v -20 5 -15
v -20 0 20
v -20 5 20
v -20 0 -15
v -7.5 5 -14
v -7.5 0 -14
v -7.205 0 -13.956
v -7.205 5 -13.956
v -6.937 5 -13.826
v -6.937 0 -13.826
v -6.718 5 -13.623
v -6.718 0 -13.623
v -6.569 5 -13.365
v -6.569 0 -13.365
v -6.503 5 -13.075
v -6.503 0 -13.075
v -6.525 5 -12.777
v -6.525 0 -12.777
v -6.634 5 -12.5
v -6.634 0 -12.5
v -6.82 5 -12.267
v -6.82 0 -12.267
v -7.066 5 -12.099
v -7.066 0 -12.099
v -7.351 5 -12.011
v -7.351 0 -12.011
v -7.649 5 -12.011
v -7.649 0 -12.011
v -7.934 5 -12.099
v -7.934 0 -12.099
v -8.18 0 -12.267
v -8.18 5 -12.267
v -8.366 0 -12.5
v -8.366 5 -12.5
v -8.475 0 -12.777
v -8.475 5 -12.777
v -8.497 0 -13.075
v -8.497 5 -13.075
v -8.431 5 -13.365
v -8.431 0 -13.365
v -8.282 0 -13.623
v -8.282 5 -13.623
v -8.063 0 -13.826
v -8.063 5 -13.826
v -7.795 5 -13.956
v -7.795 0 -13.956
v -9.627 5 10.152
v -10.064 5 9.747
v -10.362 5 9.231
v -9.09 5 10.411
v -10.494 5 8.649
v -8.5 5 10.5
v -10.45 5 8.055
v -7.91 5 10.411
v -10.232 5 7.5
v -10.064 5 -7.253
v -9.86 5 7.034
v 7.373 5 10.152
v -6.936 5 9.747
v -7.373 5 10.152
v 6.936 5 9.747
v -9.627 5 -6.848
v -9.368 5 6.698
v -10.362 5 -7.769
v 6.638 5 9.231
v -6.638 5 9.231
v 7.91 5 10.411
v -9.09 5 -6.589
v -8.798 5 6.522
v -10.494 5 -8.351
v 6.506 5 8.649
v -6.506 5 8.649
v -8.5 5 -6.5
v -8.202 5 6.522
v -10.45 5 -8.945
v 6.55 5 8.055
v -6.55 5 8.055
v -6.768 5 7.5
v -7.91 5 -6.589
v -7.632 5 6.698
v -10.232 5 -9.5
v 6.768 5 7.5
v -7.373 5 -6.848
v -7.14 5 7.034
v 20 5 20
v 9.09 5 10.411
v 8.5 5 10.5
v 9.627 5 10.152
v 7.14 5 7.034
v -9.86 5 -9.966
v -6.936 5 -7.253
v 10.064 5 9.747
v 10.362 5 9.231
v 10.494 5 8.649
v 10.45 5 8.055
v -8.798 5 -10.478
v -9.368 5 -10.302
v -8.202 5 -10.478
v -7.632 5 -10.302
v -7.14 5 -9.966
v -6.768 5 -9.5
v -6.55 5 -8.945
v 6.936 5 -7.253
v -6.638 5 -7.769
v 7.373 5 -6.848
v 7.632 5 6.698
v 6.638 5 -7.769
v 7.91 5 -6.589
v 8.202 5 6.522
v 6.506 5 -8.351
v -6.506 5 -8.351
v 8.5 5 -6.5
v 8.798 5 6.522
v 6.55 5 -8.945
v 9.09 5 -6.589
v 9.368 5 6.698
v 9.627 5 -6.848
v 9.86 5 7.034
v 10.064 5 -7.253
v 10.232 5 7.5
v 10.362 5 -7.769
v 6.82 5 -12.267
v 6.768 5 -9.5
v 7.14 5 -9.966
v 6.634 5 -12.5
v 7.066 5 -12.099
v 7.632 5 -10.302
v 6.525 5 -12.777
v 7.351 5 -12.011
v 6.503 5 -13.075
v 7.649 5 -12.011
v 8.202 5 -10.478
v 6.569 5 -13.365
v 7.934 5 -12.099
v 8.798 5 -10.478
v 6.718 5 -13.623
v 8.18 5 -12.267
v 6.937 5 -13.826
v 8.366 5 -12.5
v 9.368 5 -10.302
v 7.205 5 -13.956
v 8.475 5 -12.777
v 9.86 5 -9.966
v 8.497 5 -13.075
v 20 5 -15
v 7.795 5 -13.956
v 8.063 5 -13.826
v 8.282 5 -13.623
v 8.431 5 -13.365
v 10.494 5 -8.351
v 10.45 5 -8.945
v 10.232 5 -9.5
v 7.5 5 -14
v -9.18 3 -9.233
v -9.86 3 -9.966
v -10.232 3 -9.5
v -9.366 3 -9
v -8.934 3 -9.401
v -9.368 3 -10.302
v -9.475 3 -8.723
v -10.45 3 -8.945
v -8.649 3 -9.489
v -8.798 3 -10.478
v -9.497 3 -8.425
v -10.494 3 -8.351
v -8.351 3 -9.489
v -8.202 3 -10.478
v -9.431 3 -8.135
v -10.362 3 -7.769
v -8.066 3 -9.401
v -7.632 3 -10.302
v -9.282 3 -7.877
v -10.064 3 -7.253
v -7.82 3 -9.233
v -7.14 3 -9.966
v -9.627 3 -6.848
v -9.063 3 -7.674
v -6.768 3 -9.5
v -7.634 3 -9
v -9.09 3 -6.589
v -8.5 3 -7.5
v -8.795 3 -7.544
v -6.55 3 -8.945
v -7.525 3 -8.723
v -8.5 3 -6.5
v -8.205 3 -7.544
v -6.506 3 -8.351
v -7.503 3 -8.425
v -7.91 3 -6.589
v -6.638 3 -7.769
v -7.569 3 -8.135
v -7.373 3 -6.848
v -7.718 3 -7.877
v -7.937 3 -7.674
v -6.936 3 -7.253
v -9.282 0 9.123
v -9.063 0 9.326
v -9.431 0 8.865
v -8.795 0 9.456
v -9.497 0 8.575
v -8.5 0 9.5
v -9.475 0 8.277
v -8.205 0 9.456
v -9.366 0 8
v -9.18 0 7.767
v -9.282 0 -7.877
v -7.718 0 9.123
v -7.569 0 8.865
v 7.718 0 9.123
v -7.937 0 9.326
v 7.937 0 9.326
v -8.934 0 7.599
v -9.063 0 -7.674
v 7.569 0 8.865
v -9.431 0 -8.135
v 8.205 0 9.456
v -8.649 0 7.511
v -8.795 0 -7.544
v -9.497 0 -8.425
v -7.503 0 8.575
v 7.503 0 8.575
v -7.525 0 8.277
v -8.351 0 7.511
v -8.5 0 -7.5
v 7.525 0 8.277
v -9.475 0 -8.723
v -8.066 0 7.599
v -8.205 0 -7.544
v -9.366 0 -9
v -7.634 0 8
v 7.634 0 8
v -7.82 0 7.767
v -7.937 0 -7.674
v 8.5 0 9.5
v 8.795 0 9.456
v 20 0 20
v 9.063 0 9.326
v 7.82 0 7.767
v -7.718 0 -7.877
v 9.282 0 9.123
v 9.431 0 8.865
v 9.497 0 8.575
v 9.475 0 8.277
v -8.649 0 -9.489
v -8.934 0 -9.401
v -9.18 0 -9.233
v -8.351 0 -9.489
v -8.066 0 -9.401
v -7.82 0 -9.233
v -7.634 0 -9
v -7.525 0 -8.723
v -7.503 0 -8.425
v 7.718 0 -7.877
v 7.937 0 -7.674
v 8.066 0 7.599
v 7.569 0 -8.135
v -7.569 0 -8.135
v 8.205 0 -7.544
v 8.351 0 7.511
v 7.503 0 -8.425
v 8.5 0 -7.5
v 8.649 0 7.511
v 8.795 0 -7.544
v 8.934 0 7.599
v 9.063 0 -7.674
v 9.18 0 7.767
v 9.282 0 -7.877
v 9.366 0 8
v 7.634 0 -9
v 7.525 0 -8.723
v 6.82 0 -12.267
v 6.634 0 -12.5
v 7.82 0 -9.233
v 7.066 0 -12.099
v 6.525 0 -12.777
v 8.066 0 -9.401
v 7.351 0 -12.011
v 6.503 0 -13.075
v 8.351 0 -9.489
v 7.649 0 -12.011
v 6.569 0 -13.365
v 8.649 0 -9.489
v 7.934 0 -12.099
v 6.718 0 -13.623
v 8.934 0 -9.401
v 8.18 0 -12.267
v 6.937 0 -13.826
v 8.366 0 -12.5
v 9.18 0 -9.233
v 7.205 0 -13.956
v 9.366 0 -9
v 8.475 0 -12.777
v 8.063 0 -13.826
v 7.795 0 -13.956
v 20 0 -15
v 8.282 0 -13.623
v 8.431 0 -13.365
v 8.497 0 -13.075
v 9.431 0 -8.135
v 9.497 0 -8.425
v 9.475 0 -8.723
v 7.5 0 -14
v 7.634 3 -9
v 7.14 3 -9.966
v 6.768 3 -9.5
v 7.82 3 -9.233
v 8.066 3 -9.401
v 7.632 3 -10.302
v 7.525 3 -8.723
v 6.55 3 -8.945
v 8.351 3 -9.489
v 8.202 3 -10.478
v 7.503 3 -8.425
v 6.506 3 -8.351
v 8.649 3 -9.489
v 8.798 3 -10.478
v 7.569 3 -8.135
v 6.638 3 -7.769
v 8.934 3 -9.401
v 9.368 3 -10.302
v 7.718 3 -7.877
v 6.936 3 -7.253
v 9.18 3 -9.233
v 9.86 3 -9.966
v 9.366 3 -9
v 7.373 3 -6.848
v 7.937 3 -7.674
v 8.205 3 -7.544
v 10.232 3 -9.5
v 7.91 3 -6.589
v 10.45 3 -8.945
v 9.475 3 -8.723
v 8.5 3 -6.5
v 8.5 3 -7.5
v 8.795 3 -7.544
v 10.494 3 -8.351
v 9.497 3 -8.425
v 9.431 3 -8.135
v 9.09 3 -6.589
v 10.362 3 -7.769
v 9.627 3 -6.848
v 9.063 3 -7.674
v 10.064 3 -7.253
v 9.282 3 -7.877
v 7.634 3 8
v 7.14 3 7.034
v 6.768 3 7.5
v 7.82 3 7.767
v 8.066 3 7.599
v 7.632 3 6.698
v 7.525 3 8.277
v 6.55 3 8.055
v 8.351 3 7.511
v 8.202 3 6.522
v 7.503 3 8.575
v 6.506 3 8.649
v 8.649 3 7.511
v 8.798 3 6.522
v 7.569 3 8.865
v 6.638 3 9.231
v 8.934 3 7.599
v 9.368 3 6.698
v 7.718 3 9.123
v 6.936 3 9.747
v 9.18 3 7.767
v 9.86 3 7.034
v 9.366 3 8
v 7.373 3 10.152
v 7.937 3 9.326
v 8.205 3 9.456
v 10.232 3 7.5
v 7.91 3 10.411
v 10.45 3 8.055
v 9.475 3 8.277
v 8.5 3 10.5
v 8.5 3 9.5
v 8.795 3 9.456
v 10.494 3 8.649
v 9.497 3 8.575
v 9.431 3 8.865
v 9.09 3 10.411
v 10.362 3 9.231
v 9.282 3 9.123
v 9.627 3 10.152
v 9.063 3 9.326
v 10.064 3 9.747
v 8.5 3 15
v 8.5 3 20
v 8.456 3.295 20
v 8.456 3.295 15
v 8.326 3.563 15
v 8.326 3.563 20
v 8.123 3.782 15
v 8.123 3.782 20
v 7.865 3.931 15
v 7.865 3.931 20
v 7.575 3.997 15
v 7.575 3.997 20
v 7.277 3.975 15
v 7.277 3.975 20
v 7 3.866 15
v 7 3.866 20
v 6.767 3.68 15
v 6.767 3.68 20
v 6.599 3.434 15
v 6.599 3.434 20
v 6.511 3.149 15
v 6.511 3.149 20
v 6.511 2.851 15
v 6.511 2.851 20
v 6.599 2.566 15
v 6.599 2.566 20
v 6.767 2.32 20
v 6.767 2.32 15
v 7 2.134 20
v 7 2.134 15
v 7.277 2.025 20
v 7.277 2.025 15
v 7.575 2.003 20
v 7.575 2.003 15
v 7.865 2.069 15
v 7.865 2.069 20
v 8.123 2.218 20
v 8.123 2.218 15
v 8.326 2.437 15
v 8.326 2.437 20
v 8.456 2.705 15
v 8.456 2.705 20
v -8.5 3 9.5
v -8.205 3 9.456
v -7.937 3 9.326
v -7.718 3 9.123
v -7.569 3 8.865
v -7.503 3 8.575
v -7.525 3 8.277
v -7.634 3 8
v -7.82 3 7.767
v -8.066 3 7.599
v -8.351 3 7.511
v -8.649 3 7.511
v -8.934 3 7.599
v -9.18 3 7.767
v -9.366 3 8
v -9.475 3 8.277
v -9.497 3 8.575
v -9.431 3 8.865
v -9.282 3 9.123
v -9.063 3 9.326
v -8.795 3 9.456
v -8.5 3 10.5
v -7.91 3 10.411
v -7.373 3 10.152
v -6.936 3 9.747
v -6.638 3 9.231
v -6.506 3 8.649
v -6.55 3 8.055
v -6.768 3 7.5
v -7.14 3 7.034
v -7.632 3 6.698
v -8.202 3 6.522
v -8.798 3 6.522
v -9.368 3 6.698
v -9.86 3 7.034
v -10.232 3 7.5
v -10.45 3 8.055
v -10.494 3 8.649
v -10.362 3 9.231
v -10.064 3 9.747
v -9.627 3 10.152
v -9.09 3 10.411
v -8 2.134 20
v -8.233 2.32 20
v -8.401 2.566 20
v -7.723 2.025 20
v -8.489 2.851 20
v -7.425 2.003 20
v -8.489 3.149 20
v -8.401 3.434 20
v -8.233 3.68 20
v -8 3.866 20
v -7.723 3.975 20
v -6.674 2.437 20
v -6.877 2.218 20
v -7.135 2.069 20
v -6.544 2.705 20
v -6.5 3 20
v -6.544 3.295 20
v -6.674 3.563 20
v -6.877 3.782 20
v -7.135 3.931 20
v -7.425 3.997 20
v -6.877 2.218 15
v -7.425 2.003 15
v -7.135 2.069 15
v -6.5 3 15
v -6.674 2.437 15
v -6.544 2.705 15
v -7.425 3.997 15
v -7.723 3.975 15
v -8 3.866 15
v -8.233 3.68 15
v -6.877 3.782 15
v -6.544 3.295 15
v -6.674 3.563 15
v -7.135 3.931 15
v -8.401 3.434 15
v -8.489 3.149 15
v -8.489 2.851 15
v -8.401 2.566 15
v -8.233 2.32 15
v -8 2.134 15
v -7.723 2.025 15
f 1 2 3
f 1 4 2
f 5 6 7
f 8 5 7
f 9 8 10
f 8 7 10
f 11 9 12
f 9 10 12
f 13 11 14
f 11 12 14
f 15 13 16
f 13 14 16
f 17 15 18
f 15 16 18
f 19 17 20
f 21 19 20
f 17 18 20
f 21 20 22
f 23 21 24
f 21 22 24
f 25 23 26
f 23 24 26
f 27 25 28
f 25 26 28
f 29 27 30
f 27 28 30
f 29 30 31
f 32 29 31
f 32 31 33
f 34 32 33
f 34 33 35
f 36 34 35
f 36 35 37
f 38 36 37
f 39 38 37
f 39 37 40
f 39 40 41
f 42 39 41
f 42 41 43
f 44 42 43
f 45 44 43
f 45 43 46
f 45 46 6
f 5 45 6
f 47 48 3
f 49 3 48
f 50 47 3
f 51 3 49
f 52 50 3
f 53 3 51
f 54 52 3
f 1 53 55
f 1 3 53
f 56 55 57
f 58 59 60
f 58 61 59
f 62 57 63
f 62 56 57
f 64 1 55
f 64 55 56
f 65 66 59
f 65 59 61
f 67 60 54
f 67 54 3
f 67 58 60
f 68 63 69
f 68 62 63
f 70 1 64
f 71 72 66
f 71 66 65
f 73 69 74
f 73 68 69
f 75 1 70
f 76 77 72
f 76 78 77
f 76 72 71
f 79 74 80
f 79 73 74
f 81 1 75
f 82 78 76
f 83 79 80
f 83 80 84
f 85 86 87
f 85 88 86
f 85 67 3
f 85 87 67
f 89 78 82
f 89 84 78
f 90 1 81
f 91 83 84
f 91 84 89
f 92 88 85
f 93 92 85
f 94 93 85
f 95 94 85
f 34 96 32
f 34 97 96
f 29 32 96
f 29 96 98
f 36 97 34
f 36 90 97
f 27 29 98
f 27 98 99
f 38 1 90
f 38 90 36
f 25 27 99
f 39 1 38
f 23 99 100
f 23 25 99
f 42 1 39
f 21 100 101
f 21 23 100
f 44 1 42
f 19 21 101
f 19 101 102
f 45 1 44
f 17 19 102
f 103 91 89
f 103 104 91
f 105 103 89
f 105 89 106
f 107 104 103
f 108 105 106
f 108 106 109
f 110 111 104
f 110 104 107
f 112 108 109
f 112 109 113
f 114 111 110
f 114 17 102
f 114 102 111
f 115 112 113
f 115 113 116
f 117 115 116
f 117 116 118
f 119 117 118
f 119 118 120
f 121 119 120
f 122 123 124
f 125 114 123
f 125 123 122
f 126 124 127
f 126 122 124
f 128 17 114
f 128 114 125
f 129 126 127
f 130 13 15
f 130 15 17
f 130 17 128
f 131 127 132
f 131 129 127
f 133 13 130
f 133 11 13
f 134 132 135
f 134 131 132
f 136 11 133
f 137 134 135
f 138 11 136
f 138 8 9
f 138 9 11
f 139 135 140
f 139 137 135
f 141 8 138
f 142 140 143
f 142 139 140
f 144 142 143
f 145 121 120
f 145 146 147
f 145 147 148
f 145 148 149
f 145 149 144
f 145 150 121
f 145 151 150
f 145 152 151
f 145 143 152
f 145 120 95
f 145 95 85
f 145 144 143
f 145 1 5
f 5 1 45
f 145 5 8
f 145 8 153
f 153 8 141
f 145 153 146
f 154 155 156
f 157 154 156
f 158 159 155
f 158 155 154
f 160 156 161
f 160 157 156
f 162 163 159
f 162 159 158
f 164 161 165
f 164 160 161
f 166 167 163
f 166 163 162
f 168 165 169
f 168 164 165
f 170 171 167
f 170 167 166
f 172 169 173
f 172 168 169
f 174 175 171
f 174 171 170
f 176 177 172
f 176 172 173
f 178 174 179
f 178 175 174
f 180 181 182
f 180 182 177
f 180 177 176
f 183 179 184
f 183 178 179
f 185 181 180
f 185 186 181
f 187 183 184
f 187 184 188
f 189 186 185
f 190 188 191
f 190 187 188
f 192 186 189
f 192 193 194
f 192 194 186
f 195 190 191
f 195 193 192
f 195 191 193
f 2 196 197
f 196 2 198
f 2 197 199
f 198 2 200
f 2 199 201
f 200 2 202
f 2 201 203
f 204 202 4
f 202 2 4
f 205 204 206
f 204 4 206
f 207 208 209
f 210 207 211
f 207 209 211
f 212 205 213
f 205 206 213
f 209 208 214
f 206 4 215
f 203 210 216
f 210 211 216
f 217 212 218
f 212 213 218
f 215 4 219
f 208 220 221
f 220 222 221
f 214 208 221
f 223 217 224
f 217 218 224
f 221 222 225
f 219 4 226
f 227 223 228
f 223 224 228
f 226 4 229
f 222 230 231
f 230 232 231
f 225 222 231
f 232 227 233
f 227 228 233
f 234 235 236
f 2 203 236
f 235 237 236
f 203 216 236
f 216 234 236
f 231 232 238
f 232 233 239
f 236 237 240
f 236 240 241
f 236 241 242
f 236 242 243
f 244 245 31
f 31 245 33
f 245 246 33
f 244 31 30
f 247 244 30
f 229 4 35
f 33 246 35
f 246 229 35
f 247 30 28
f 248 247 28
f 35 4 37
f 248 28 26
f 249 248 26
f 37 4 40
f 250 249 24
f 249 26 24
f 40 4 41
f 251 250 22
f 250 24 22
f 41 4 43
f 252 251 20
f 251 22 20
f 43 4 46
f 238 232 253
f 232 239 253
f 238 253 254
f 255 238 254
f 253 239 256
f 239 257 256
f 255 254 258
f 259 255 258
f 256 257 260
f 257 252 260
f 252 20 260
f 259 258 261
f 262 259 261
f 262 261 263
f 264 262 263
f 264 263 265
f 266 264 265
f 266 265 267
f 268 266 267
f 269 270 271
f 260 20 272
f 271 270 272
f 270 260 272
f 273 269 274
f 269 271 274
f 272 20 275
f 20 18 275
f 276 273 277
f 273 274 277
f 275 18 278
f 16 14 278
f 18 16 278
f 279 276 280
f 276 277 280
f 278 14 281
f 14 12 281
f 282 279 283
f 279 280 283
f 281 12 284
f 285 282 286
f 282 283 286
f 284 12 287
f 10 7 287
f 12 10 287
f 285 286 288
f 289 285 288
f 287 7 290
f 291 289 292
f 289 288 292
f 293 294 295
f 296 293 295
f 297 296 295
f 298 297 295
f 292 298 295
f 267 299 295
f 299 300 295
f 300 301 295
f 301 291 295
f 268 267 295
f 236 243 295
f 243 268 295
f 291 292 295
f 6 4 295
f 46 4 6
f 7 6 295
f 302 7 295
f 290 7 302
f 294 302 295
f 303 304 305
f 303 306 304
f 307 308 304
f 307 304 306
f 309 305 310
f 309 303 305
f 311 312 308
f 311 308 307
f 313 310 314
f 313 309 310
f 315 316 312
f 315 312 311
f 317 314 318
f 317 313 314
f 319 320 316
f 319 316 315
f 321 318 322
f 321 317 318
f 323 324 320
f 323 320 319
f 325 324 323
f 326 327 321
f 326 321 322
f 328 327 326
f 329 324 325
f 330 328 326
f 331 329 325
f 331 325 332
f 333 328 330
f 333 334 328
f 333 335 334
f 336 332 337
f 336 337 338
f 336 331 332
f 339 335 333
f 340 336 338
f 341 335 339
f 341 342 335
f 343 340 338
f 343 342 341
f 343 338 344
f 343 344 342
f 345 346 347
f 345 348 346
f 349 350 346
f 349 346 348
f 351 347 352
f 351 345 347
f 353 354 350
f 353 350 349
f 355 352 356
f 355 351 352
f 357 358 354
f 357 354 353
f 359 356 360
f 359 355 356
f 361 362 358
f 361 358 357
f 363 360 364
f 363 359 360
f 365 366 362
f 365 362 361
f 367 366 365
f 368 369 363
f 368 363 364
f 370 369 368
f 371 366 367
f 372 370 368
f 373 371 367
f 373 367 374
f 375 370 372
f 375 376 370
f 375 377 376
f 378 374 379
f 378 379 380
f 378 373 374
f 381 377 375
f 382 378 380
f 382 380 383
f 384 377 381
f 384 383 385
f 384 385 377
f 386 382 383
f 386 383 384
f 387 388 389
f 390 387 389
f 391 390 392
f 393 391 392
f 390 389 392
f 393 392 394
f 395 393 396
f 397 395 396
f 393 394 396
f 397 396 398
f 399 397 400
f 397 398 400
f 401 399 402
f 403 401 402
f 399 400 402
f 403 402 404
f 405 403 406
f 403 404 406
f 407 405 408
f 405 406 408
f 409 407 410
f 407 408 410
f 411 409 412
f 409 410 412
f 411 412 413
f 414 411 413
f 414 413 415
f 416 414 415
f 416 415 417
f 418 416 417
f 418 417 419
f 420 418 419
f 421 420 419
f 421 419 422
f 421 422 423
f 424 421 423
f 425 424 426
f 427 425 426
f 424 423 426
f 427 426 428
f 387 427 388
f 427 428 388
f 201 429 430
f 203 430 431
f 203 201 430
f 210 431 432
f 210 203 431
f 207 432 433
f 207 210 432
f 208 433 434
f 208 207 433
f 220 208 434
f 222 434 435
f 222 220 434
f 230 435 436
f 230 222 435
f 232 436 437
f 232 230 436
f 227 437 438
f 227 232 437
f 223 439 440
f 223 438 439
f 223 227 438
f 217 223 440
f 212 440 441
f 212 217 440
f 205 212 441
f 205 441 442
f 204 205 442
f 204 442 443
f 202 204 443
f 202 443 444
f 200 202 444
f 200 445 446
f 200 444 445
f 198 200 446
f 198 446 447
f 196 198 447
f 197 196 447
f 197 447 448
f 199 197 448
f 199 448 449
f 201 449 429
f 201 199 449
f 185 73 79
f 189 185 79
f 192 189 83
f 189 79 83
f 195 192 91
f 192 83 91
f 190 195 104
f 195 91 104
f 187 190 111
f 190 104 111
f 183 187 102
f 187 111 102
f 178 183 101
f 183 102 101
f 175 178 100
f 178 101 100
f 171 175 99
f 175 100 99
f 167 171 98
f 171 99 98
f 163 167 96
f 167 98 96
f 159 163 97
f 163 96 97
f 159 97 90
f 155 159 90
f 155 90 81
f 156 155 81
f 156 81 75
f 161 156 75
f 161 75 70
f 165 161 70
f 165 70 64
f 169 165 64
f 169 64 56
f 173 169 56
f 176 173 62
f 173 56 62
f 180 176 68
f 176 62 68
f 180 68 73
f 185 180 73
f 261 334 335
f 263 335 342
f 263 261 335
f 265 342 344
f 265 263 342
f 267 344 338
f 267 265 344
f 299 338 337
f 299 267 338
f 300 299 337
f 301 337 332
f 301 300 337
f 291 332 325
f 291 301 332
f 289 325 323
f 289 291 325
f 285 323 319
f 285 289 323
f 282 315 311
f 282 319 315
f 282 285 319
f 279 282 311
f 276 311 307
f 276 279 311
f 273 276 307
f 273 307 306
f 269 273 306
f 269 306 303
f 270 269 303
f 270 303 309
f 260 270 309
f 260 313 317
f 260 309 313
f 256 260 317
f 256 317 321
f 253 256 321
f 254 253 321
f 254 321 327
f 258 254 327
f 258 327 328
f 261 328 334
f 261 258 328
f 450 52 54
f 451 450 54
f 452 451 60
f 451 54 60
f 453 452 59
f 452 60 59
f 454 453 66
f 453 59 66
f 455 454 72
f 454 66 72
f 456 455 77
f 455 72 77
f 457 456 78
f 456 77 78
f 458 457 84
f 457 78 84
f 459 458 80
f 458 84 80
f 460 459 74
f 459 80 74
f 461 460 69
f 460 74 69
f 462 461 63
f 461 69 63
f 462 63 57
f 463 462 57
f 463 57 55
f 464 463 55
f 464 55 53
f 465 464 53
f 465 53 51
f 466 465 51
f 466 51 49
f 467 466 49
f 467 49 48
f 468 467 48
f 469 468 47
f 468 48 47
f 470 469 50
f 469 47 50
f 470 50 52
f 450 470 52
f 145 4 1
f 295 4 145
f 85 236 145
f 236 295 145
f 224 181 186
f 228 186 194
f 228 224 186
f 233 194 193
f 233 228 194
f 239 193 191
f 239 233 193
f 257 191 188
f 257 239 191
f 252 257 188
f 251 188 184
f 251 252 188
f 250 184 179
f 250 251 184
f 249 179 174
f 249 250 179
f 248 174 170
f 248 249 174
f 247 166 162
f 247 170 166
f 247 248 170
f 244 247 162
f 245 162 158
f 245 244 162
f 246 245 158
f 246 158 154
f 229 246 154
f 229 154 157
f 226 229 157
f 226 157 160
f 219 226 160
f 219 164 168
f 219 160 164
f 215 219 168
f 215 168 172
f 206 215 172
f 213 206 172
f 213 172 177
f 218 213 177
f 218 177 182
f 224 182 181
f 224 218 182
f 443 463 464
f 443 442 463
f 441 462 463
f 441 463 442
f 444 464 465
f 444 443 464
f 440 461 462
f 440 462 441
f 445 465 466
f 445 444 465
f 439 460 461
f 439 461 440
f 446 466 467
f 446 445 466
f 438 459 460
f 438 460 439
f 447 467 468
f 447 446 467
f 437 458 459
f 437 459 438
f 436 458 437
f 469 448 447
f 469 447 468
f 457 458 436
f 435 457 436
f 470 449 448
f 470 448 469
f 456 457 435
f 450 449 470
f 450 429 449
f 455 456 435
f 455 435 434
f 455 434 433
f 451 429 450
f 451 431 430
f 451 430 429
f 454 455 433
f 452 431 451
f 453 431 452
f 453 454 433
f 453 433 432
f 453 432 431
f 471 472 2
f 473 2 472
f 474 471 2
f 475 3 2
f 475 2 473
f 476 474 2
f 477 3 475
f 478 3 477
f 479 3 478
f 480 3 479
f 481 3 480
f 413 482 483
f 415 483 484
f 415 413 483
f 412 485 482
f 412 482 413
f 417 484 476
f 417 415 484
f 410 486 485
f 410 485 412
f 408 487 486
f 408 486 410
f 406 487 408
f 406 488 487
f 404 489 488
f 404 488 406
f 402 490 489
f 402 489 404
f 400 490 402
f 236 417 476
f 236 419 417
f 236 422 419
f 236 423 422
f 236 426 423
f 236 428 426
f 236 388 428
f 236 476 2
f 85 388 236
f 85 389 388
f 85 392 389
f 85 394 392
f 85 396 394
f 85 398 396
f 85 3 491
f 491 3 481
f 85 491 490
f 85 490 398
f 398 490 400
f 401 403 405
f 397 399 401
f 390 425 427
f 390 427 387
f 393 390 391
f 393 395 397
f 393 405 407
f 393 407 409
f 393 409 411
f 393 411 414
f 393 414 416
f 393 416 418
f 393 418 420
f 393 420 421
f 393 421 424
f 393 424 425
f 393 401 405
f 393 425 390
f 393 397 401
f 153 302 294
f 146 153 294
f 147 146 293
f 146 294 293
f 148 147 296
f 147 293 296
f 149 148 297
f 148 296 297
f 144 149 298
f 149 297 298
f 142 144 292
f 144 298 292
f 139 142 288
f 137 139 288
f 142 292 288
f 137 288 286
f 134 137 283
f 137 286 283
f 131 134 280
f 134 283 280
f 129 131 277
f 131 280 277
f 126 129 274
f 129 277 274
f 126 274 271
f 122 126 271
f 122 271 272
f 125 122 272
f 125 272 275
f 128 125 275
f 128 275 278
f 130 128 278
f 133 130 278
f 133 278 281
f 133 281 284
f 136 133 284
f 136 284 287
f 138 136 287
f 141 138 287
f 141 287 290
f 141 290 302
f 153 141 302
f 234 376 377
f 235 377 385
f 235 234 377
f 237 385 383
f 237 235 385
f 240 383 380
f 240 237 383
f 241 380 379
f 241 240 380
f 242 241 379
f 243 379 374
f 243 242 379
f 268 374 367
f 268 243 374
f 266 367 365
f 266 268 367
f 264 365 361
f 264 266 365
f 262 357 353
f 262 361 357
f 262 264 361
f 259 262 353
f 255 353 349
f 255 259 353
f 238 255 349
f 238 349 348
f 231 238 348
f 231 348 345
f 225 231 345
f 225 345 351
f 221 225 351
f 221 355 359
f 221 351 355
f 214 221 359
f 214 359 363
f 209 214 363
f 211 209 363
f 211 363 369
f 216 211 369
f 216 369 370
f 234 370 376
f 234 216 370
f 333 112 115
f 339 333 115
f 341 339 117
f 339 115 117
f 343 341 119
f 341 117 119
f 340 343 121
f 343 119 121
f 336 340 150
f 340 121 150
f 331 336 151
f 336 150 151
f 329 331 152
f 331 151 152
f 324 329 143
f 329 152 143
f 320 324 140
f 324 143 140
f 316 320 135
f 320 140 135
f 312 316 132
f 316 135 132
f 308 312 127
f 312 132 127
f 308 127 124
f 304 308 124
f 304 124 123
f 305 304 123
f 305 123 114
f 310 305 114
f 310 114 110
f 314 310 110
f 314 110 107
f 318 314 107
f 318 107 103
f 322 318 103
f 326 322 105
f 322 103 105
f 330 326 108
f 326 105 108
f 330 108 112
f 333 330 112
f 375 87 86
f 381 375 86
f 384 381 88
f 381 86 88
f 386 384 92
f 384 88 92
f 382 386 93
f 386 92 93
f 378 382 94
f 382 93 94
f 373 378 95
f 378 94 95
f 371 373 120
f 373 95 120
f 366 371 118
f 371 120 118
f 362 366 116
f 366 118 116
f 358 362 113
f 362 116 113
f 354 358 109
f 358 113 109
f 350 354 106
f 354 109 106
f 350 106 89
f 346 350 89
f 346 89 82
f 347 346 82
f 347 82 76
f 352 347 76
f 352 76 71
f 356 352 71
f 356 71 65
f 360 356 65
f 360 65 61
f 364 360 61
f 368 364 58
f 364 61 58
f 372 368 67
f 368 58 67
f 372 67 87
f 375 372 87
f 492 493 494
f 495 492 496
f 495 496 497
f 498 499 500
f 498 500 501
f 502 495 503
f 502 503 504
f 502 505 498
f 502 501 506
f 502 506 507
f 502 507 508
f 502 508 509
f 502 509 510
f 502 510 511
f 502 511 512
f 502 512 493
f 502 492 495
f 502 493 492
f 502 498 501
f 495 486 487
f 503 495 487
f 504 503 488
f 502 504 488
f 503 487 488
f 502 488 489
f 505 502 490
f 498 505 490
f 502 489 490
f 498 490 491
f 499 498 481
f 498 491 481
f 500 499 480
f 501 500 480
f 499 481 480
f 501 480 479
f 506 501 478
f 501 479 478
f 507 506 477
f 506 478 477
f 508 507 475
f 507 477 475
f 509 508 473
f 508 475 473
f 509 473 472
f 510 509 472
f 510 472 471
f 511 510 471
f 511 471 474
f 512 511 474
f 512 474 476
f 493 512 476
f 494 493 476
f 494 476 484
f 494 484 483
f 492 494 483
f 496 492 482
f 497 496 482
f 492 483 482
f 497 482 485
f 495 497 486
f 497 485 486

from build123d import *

# Parameters (mm, degrees)
SKETCH2_W           = 40
SKETCH2_H           = 30
SKETCH2_R           = 1
BOSS_EXTRUDE1_DEPTH = 5
SKETCH3_R           = 2
CUT_EXTRUDE1_DEPTH  = 2
SKETCH5_R           = 1
CUT_EXTRUDE2_DEPTH  = 26.495097568
SKETCH7_W           = 40
SKETCH7_H           = 5
BOSS_EXTRUDE2_DEPTH = 5
SKETCH8_R           = 1
CUT_EXTRUDE3_DEPTH  = 5


with BuildPart() as part:
    # Sketch2 → Boss-Extrude1 (new body)
    with BuildSketch(Plane(origin=(0, 0, 0), x_dir=(1, 0, 0), z_dir=(0, 1, 0))):
        Rectangle(SKETCH2_W, SKETCH2_H)
        with Locations(Location((-8.5, 8.5, 0), (0, 0, 270))):
            Circle(SKETCH2_R, mode=Mode.SUBTRACT)
        with Locations(Location((8.5, 8.5, 0), (0, 0, 270))):
            Circle(SKETCH2_R, mode=Mode.SUBTRACT)
        with Locations(Location((8.5, -8.5, 0), (0, 0, 270))):
            Circle(SKETCH2_R, mode=Mode.SUBTRACT)
        with Locations(Location((-8.5, -8.5, 0), (0, 0, 270))):
            Circle(SKETCH2_R, mode=Mode.SUBTRACT)
    extrude(amount=BOSS_EXTRUDE1_DEPTH)

    # Sketch3 → Cut-Extrude1 (cut)
    with BuildSketch(Plane(origin=(0, 5, 0), x_dir=(1, 0, 0), z_dir=(0, 1, 0))):
        with Locations(Location((-8.5, 8.5, 0), (0, 0, 270))):
            Circle(SKETCH3_R)
        with Locations(Location((8.5, 8.5, 0), (0, 0, 270))):
            Circle(SKETCH3_R)
        with Locations(Location((8.5, -8.5, 0), (0, 0, 270))):
            Circle(SKETCH3_R)
        with Locations(Location((-8.5, -8.5, 0), (0, 0, 270))):
            Circle(SKETCH3_R)
    extrude(amount=-CUT_EXTRUDE1_DEPTH, mode=Mode.SUBTRACT)

    # Sketch5 → Cut-Extrude2 (cut, through all)
    with BuildSketch(Plane.XZ):
        with Locations(Location((-7.5, -13, 0), (0, 0, 270))):
            Circle(SKETCH5_R)
        with Locations(Location((7.5, -13, 0), (0, 0, 270))):
            Circle(SKETCH5_R)
    extrude(amount=-CUT_EXTRUDE2_DEPTH, mode=Mode.SUBTRACT)

    # Sketch7 → Boss-Extrude2 (add)
    with BuildSketch(Plane.XY.offset(15)):
        with Locations((0, 2.5)):
            Rectangle(SKETCH7_W, SKETCH7_H)
    extrude(amount=BOSS_EXTRUDE2_DEPTH)

    # Sketch8 → Cut-Extrude3 (cut)
    with BuildSketch(Plane.XY.offset(20)):
        with Locations((-7.5, 3)):
            Circle(SKETCH8_R)
        with Locations((7.5, 3)):
            Circle(SKETCH8_R)
    extrude(amount=-CUT_EXTRUDE3_DEPTH, mode=Mode.SUBTRACT)


solid = part.part
